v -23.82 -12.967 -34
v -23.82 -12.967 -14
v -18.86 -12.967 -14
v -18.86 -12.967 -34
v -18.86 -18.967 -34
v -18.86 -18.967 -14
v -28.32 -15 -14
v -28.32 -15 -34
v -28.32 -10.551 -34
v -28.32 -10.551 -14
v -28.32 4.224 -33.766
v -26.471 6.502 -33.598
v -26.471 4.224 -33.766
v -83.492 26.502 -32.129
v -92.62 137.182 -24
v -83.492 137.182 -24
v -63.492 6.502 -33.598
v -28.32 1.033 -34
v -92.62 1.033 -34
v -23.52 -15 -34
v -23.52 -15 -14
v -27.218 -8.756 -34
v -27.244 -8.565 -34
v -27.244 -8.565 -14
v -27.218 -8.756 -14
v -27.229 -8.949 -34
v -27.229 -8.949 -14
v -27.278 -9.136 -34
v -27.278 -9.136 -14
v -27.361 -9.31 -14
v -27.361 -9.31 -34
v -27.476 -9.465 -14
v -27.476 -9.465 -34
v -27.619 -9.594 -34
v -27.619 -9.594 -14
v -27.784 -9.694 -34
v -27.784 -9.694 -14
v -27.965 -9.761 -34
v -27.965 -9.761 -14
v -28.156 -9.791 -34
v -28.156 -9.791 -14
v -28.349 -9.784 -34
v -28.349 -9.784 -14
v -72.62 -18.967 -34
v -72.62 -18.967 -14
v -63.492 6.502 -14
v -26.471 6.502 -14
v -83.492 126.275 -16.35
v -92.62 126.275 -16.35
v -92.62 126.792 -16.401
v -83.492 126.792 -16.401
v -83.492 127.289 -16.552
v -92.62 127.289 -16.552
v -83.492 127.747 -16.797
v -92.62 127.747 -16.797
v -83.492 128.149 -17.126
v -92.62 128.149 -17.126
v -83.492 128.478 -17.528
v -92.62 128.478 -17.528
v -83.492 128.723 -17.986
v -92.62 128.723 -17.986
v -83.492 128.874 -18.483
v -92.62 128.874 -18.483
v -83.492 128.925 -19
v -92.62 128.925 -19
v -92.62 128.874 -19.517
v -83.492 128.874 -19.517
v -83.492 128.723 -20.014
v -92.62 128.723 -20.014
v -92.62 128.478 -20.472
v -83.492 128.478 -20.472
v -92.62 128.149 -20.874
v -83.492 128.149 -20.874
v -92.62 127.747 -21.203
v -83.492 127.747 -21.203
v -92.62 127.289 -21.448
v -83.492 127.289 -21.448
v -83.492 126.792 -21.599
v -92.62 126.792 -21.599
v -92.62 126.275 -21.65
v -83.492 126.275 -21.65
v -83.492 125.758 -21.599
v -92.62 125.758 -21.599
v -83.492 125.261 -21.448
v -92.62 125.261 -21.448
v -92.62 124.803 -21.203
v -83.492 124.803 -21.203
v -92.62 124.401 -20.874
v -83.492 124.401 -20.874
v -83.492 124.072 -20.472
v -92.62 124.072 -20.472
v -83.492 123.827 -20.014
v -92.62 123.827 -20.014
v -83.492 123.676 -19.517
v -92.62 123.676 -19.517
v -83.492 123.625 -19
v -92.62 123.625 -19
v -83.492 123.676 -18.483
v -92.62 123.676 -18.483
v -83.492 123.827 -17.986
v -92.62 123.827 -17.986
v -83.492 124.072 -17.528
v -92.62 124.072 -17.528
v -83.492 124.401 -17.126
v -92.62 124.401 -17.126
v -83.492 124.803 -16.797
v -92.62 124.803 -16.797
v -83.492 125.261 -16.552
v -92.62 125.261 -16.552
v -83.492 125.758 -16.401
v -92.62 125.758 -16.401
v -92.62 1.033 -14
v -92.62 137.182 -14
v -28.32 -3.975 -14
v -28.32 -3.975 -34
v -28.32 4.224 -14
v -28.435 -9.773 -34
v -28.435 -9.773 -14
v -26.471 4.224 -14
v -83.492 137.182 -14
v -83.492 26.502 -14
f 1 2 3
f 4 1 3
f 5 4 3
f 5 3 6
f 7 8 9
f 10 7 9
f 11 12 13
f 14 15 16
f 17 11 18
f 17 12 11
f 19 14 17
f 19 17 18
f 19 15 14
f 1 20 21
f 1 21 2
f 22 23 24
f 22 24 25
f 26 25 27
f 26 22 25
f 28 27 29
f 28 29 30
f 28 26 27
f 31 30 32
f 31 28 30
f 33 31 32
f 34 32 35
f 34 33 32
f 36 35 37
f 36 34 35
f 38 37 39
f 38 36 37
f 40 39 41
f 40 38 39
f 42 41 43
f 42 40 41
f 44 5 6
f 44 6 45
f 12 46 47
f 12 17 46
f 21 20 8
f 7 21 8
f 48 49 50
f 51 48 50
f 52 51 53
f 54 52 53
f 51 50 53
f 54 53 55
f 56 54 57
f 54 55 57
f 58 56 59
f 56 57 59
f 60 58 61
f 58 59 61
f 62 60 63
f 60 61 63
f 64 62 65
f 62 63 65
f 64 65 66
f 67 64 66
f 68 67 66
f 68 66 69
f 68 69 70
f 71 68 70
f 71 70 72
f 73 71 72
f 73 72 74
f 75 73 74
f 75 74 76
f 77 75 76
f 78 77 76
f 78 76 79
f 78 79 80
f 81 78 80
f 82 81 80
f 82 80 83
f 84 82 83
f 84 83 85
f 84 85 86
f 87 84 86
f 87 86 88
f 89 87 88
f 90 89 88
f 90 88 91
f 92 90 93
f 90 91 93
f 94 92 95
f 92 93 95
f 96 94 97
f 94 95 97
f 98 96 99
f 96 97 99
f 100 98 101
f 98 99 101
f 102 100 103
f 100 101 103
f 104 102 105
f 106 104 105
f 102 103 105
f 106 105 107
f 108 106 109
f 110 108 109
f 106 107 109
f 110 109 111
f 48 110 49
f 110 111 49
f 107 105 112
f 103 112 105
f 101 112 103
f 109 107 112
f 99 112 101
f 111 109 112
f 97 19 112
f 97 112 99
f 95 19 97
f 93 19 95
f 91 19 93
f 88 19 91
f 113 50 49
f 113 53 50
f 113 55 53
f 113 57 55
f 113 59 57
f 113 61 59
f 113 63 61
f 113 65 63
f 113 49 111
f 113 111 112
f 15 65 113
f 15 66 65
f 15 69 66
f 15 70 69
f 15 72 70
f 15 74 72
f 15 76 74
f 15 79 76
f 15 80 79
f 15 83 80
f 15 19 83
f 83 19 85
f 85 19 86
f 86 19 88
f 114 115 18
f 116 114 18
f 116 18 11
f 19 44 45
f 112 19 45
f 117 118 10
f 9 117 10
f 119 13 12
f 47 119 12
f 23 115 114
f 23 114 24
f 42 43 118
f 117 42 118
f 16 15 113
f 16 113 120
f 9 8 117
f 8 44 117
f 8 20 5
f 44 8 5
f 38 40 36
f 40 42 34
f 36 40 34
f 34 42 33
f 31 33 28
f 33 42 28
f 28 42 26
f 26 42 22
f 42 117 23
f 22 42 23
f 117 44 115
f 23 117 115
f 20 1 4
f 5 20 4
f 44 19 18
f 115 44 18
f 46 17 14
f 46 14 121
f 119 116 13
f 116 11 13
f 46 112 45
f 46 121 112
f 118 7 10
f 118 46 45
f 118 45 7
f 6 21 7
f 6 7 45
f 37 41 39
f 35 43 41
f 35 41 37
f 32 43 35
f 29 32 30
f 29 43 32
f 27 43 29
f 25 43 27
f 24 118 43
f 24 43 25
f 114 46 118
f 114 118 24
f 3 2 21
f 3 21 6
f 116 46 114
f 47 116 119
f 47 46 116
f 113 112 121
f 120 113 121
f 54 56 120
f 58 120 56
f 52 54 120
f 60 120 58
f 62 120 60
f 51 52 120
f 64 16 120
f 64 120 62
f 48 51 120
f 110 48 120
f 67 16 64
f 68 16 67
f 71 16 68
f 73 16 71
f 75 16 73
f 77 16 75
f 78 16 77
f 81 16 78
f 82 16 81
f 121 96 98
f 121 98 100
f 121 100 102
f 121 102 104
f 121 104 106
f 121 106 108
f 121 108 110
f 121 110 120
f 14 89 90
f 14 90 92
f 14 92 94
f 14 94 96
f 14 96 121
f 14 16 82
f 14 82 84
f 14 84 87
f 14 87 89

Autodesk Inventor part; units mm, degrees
ref_plane "YZ Plane" through (0, 0, 0) normal (1, 0, 0) x (0, 1, 0)
ref_plane "XZ Plane" through (0, 0, 0) normal (0, 1, 0) x (-1, 0, 0)
ref_plane "XY Plane" through (0, 0, 0) normal (0, 0, 1) x (1, 0, 0)
ref_plane "Work Plane1" through (0, 0, 0) normal (0, 0, 1) x (1, 0, 0)
ref_plane "Work Plane2" through (0, 0, -24) normal (0, 0, 1) x (1, 0, 0)
sketch "Sketch1" plane through (0, 0, -24) normal (0, 0, 1) x (1, 0, 0)
  line L0 (-28.32, -15) -> (-28.32, -9.975) projected
  line L1 (-28.32, -3.975) -> (-28.32, 4.075) projected
  line L2 (-23.82, -15) -> (-28.32, -15) projected
  line L3 (-23.82, -15) -> (-23.52, -15)
  line L4 (-23.52, -15) -> (-23.82, -12.9669)
  line L5 (-23.82, -12.9669) -> (-18.8601, -12.9669)
  line L6 (-18.8601, -12.9669) -> (-18.8601, -18.9669)
  line L7 (-18.8601, -18.9669) -> (-92.6205, -18.9669)
  line L8 (-92.6205, -18.9669) -> (-92.6205, 137.182)
  line L9 (-92.6205, 137.182) -> (-83.4923, 137.182)
  line L10 (-83.4923, 137.182) -> (-83.4923, 6.5025)
  line L11 (-83.4923, 6.5025) -> (-28.32, 6.5025)
  line L12 (-28.32, -3.975) -> (-26.9128, -9.975)
  line L13 (-26.9128, -9.975) -> (-28.4348, -9.773)
  line L14 (-28.4348, -9.773) -> (-28.32, -10.5507)
  line L15 (-28.32, -10.5507) -> (-28.32, -15)
  line L16 (-28.32, -15) -> (-23.82, -15)
  line L17 (-28.32, 4.075) -> (-28.32, 4.2239)
  line L18 (-28.32, 4.2239) -> (-26.4709, 4.2239)
  line L19 (-26.4709, 4.2239) -> (-26.4709, 6.5025)
  line L20 (-26.4709, 6.5025) -> (-28.32, 6.5025)
  point P0 (0, 0)
  dimension "d0" = 0.3
  dimension "d1" = 6
extrude "Extrusion1" add sketch "Sketch1" along normal mid plane 20
fillet "Fillet1" radius 1 1 edges at (-26.9128, -9.975, -24)
chamfer "Chamfer1" distance 20 angle 45 2 edges at (-83.4923, 6.5025, -24) (-92.6205, -18.9669, -24)
sketch "Sketch2" plane through (-92.6205, 137.182, -34) normal (-1, 0, 0) x (0, 0, 1)
  line L0 (18.675, -27.877) -> (18.675, 6.063) projected
  line L1 (-16.4278, 9.4711) -> (-17.2496, 12.5384) projected
  line L2 (-17.2496, 12.5384) -> (-20.3169, 13.3602) projected
  line L3 (-20.3169, 13.3602) -> (-22.5622, 11.1149) projected
  line L4 (-22.5622, 11.1149) -> (-21.7404, 8.0476) projected
  line L5 (-21.7404, 8.0476) -> (-18.6731, 7.2258) projected
  line L6 (-18.6731, 7.2258) -> (-16.4278, 9.4711) projected
  line L7 (23.7269, -35.1742) -> (25.9722, -32.9289) projected
  line L8 (25.9722, -32.9289) -> (25.1504, -29.8616) projected
  line L9 (25.1504, -29.8616) -> (22.0831, -29.0398) projected
  line L10 (22.0831, -29.0398) -> (19.8378, -31.2851) projected
  line L11 (19.8378, -31.2851) -> (20.6596, -34.3524) projected
  line L12 (20.6596, -34.3524) -> (23.7269, -35.1742) projected
  circle A0 centre (16.005, 9.753) radius 2.475 projected
  circle A1 centre (-18.955, 3.393) radius 2.475 projected
  circle A2 centre (-12.595, -31.567) radius 2.475 projected
  circle A3 centre (22.365, -25.207) radius 2.475 projected
  circle A4 centre (22.365, 3.393) radius 2.475 projected
  circle A5 centre (16.005, -31.567) radius 2.475 projected
  circle A6 centre (-18.955, -25.207) radius 2.475 projected
  circle A7 centre (-12.595, 9.753) radius 2.475 projected
  arc A8 (-20.655, -19.707) -> (-17.255, -19.707) centre (-18.955, -19.707) ccw projected
  line L13 (-17.255, -19.707) -> (-17.255, -2.107) projected
  arc A9 (-17.255, -2.107) -> (-20.655, -2.107) centre (-18.955, -2.107) ccw projected
  line L14 (-20.655, -2.107) -> (-20.655, -19.707) projected
  arc A10 (20.665, -19.707) -> (24.065, -19.707) centre (22.365, -19.707) ccw projected
  line L15 (24.065, -19.707) -> (24.065, -2.107) projected
  arc A11 (24.065, -2.107) -> (20.665, -2.107) centre (22.365, -2.107) ccw projected
  line L16 (20.665, -2.107) -> (20.665, -19.707) projected
  arc A12 (10.505, -33.267) -> (10.505, -29.867) centre (10.505, -31.567) ccw projected
  line L17 (10.505, -29.867) -> (-7.095, -29.867) projected
  arc A13 (-7.095, -29.867) -> (-7.095, -33.267) centre (-7.095, -31.567) ccw projected
  line L18 (-7.095, -33.267) -> (10.505, -33.267) projected
  arc A14 (-7.095, 11.453) -> (-7.095, 8.053) centre (-7.095, 9.753) ccw projected
  line L19 (-7.095, 8.053) -> (10.505, 8.053) projected
  arc A15 (10.505, 8.053) -> (10.505, 11.453) centre (10.505, 9.753) ccw projected
  line L20 (10.505, 11.453) -> (-7.095, 11.453) projected
  line L21 (-15.265, -27.877) -> (18.675, -27.877) projected
  line L22 (18.675, -27.877) -> (18.675, 6.063) projected
  line L23 (18.675, 6.063) -> (-15.265, 6.063) projected
  line L24 (-15.265, 6.063) -> (-15.265, -27.877) projected
  circle A16 centre (-19.495, -32.107) radius 2.75 projected
  circle A17 centre (22.905, 10.293) radius 2.75 projected
  arc A18 (-22.645, -33.757) -> (-21.145, -35.257) centre (-21.145, -33.757) ccw projected
  line L25 (-22.645, 11.943) -> (-22.645, -33.757) projected
  arc A19 (-21.145, 13.443) -> (-22.645, 11.943) centre (-21.145, 11.943) ccw projected
  line L26 (24.555, 13.443) -> (-21.145, 13.443) projected
  arc A20 (26.055, 11.943) -> (24.555, 13.443) centre (24.555, 11.943) ccw projected
  line L27 (26.055, -33.757) -> (26.055, 11.943) projected
  arc A21 (24.555, -35.257) -> (26.055, -33.757) centre (24.555, -33.757) ccw projected
  line L28 (-21.145, -35.257) -> (24.555, -35.257) projected
  circle A22 centre (1.705, -10.907) radius 16.97
  circle A23 centre (15, -10.907) radius 2.65
  line L29 (20, 0) -> (20, -136.1489) projected
  line L30 (20, -136.1489) -> (0, -136.1489) projected
  line L31 (20, 0) -> (20, -136.1489) projected
  line L32 (0, 0) -> (20, 0) projected
  line L33 (0, -136.1489) -> (0, 0) projected
  line L34 (0, 0) -> (20, 0) projected
  line L35 (10, 0) -> (0, -136.1489)
  point P0 (34, -137.182)
  dimension "d8" = 5.3
  dimension "d9" = 5
extrude "Extrusion2" cut sketch "Sketch2" against normal through all contours L35 L17 L33 L21 | L21 A22 L35 | A22 L33 L32 L35 | L21 L33 A22 | L35 L18 L33 L17 | L35 L28 L33 L18 | L35 L33 L28 | A23
properties part number "30_Adapter_neje_LED"
